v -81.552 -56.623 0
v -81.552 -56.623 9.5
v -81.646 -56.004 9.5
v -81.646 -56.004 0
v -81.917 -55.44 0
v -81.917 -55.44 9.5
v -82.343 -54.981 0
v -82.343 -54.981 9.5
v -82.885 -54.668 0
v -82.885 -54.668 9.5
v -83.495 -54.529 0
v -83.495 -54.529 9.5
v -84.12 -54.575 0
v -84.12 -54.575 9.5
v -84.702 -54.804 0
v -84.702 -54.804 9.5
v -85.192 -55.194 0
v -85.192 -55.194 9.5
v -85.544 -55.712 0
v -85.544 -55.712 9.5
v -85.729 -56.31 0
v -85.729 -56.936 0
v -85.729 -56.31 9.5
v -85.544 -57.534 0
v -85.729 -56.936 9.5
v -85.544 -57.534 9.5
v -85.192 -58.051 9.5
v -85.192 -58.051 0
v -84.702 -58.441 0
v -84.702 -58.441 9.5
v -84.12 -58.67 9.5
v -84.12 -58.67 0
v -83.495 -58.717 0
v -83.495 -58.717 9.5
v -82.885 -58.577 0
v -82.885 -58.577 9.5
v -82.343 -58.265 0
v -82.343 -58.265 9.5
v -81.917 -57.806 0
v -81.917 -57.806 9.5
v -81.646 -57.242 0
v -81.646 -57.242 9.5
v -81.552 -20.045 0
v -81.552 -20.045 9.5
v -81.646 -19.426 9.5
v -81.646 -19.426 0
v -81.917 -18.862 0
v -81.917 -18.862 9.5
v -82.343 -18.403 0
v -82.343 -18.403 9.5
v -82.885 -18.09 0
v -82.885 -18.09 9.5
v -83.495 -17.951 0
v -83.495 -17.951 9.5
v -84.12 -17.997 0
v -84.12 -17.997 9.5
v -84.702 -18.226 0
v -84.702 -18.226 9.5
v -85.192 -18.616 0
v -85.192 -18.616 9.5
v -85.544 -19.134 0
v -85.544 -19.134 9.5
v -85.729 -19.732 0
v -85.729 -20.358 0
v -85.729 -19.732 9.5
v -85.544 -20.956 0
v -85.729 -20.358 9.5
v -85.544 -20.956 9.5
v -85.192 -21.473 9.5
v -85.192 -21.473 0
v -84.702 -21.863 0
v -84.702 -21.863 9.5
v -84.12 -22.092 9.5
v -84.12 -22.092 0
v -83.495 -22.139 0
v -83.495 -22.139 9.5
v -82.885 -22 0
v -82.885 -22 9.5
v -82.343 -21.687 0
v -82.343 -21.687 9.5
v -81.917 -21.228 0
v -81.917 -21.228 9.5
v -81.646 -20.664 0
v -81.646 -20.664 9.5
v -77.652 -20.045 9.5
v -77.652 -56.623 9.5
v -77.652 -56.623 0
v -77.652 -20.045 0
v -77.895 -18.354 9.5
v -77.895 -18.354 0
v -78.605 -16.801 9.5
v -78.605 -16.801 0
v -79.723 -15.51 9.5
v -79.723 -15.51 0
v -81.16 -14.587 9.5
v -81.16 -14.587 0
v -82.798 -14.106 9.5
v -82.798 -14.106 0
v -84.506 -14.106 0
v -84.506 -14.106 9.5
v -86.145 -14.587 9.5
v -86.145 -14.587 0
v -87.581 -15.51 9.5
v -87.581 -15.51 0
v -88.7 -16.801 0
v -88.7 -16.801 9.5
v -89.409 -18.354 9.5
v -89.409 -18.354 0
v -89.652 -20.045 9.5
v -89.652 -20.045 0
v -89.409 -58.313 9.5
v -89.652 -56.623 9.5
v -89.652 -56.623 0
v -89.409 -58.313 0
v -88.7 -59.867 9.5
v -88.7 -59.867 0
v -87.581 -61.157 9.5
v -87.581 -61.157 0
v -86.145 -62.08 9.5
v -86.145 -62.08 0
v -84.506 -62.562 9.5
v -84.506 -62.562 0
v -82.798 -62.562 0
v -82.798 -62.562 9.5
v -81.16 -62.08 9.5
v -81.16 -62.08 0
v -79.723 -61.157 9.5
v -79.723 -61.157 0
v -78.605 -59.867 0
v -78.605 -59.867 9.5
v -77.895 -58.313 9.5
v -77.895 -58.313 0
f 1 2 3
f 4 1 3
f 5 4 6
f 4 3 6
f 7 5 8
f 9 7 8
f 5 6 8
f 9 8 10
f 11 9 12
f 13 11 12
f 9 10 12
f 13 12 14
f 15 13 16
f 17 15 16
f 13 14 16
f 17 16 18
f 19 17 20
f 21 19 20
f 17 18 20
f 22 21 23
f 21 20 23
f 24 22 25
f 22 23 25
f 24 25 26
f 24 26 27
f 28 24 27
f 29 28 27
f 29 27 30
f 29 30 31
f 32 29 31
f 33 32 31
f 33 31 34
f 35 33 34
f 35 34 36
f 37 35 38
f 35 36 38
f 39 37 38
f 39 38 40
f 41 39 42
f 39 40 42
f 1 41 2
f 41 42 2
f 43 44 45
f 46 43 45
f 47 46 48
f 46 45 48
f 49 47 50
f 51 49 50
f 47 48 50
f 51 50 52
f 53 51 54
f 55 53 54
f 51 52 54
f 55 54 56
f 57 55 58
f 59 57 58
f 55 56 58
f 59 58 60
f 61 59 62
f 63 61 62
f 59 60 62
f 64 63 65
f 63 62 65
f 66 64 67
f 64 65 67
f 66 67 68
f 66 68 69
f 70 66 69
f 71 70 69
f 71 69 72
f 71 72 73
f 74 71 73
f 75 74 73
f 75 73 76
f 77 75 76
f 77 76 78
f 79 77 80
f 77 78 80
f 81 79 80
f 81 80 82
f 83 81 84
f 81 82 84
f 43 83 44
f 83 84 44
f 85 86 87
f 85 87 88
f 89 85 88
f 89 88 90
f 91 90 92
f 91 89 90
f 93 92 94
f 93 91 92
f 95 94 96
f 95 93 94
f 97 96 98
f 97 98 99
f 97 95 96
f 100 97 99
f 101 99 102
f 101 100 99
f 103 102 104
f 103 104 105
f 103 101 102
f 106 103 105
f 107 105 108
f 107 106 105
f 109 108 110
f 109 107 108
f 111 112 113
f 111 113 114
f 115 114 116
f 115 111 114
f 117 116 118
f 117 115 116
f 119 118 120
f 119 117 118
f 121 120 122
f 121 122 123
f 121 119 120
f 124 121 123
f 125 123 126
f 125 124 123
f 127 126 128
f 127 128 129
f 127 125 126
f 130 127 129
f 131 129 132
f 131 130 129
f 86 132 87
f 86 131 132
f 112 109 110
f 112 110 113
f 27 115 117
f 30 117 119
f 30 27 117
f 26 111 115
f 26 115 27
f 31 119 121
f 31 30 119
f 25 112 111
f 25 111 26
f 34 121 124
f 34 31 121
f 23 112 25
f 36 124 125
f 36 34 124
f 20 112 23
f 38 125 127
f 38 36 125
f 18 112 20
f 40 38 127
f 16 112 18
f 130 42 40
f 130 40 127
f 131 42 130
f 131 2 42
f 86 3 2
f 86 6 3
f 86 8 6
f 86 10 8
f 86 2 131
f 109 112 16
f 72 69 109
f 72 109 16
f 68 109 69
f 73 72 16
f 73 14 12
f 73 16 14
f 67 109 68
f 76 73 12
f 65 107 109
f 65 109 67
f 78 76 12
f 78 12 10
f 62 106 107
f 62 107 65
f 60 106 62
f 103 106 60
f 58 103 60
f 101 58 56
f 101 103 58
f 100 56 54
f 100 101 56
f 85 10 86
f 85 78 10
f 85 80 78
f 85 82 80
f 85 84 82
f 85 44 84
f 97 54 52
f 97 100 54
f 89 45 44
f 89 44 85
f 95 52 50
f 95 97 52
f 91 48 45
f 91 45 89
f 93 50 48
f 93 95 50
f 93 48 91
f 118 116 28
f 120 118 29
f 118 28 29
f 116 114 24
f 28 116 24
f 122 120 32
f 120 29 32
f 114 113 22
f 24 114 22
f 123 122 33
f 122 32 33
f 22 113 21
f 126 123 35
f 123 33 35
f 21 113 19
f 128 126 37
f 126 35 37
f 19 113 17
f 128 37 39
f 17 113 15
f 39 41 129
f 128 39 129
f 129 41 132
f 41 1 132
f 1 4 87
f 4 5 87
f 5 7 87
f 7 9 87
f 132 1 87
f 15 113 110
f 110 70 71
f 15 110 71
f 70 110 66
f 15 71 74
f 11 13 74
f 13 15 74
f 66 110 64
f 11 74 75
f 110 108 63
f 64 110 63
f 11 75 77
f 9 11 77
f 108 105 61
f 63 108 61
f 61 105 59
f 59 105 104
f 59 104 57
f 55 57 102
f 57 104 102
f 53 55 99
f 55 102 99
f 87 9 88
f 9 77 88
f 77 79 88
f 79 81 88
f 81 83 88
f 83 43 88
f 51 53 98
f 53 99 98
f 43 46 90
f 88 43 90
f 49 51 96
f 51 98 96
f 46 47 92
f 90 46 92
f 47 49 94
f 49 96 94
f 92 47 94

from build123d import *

# Parameters (mm, degrees)
ESBO_O1_R                = 2.1
RESSALTO_EXTRUS_O1_DEPTH = 9.5


with BuildPart() as part:
    # Esboço1 → Ressalto-extrusão1 (new body)
    with BuildSketch(Plane.XY.offset(9.5)):
        with BuildLine():
            Line((-77.652318909, -56.622659468), (-77.652318909, -20.044841126))
            ThreePointArc((-77.652318909, -20.044841126), (-83.652318909, -14.044841126), (-89.652318909, -20.044841126))
            Line((-89.652318909, -20.044841126), (-89.652318909, -56.622659468))
            ThreePointArc((-89.652318909, -56.622659468), (-83.652318909, -62.622659468), (-77.652318909, -56.622659468))
        make_face()
        with Locations((-83.652318909, -56.622659468)):
            Circle(ESBO_O1_R, mode=Mode.SUBTRACT)
        with Locations((-83.652318909, -20.044841126)):
            Circle(ESBO_O1_R, mode=Mode.SUBTRACT)
    extrude(amount=-RESSALTO_EXTRUS_O1_DEPTH)


solid = part.part
